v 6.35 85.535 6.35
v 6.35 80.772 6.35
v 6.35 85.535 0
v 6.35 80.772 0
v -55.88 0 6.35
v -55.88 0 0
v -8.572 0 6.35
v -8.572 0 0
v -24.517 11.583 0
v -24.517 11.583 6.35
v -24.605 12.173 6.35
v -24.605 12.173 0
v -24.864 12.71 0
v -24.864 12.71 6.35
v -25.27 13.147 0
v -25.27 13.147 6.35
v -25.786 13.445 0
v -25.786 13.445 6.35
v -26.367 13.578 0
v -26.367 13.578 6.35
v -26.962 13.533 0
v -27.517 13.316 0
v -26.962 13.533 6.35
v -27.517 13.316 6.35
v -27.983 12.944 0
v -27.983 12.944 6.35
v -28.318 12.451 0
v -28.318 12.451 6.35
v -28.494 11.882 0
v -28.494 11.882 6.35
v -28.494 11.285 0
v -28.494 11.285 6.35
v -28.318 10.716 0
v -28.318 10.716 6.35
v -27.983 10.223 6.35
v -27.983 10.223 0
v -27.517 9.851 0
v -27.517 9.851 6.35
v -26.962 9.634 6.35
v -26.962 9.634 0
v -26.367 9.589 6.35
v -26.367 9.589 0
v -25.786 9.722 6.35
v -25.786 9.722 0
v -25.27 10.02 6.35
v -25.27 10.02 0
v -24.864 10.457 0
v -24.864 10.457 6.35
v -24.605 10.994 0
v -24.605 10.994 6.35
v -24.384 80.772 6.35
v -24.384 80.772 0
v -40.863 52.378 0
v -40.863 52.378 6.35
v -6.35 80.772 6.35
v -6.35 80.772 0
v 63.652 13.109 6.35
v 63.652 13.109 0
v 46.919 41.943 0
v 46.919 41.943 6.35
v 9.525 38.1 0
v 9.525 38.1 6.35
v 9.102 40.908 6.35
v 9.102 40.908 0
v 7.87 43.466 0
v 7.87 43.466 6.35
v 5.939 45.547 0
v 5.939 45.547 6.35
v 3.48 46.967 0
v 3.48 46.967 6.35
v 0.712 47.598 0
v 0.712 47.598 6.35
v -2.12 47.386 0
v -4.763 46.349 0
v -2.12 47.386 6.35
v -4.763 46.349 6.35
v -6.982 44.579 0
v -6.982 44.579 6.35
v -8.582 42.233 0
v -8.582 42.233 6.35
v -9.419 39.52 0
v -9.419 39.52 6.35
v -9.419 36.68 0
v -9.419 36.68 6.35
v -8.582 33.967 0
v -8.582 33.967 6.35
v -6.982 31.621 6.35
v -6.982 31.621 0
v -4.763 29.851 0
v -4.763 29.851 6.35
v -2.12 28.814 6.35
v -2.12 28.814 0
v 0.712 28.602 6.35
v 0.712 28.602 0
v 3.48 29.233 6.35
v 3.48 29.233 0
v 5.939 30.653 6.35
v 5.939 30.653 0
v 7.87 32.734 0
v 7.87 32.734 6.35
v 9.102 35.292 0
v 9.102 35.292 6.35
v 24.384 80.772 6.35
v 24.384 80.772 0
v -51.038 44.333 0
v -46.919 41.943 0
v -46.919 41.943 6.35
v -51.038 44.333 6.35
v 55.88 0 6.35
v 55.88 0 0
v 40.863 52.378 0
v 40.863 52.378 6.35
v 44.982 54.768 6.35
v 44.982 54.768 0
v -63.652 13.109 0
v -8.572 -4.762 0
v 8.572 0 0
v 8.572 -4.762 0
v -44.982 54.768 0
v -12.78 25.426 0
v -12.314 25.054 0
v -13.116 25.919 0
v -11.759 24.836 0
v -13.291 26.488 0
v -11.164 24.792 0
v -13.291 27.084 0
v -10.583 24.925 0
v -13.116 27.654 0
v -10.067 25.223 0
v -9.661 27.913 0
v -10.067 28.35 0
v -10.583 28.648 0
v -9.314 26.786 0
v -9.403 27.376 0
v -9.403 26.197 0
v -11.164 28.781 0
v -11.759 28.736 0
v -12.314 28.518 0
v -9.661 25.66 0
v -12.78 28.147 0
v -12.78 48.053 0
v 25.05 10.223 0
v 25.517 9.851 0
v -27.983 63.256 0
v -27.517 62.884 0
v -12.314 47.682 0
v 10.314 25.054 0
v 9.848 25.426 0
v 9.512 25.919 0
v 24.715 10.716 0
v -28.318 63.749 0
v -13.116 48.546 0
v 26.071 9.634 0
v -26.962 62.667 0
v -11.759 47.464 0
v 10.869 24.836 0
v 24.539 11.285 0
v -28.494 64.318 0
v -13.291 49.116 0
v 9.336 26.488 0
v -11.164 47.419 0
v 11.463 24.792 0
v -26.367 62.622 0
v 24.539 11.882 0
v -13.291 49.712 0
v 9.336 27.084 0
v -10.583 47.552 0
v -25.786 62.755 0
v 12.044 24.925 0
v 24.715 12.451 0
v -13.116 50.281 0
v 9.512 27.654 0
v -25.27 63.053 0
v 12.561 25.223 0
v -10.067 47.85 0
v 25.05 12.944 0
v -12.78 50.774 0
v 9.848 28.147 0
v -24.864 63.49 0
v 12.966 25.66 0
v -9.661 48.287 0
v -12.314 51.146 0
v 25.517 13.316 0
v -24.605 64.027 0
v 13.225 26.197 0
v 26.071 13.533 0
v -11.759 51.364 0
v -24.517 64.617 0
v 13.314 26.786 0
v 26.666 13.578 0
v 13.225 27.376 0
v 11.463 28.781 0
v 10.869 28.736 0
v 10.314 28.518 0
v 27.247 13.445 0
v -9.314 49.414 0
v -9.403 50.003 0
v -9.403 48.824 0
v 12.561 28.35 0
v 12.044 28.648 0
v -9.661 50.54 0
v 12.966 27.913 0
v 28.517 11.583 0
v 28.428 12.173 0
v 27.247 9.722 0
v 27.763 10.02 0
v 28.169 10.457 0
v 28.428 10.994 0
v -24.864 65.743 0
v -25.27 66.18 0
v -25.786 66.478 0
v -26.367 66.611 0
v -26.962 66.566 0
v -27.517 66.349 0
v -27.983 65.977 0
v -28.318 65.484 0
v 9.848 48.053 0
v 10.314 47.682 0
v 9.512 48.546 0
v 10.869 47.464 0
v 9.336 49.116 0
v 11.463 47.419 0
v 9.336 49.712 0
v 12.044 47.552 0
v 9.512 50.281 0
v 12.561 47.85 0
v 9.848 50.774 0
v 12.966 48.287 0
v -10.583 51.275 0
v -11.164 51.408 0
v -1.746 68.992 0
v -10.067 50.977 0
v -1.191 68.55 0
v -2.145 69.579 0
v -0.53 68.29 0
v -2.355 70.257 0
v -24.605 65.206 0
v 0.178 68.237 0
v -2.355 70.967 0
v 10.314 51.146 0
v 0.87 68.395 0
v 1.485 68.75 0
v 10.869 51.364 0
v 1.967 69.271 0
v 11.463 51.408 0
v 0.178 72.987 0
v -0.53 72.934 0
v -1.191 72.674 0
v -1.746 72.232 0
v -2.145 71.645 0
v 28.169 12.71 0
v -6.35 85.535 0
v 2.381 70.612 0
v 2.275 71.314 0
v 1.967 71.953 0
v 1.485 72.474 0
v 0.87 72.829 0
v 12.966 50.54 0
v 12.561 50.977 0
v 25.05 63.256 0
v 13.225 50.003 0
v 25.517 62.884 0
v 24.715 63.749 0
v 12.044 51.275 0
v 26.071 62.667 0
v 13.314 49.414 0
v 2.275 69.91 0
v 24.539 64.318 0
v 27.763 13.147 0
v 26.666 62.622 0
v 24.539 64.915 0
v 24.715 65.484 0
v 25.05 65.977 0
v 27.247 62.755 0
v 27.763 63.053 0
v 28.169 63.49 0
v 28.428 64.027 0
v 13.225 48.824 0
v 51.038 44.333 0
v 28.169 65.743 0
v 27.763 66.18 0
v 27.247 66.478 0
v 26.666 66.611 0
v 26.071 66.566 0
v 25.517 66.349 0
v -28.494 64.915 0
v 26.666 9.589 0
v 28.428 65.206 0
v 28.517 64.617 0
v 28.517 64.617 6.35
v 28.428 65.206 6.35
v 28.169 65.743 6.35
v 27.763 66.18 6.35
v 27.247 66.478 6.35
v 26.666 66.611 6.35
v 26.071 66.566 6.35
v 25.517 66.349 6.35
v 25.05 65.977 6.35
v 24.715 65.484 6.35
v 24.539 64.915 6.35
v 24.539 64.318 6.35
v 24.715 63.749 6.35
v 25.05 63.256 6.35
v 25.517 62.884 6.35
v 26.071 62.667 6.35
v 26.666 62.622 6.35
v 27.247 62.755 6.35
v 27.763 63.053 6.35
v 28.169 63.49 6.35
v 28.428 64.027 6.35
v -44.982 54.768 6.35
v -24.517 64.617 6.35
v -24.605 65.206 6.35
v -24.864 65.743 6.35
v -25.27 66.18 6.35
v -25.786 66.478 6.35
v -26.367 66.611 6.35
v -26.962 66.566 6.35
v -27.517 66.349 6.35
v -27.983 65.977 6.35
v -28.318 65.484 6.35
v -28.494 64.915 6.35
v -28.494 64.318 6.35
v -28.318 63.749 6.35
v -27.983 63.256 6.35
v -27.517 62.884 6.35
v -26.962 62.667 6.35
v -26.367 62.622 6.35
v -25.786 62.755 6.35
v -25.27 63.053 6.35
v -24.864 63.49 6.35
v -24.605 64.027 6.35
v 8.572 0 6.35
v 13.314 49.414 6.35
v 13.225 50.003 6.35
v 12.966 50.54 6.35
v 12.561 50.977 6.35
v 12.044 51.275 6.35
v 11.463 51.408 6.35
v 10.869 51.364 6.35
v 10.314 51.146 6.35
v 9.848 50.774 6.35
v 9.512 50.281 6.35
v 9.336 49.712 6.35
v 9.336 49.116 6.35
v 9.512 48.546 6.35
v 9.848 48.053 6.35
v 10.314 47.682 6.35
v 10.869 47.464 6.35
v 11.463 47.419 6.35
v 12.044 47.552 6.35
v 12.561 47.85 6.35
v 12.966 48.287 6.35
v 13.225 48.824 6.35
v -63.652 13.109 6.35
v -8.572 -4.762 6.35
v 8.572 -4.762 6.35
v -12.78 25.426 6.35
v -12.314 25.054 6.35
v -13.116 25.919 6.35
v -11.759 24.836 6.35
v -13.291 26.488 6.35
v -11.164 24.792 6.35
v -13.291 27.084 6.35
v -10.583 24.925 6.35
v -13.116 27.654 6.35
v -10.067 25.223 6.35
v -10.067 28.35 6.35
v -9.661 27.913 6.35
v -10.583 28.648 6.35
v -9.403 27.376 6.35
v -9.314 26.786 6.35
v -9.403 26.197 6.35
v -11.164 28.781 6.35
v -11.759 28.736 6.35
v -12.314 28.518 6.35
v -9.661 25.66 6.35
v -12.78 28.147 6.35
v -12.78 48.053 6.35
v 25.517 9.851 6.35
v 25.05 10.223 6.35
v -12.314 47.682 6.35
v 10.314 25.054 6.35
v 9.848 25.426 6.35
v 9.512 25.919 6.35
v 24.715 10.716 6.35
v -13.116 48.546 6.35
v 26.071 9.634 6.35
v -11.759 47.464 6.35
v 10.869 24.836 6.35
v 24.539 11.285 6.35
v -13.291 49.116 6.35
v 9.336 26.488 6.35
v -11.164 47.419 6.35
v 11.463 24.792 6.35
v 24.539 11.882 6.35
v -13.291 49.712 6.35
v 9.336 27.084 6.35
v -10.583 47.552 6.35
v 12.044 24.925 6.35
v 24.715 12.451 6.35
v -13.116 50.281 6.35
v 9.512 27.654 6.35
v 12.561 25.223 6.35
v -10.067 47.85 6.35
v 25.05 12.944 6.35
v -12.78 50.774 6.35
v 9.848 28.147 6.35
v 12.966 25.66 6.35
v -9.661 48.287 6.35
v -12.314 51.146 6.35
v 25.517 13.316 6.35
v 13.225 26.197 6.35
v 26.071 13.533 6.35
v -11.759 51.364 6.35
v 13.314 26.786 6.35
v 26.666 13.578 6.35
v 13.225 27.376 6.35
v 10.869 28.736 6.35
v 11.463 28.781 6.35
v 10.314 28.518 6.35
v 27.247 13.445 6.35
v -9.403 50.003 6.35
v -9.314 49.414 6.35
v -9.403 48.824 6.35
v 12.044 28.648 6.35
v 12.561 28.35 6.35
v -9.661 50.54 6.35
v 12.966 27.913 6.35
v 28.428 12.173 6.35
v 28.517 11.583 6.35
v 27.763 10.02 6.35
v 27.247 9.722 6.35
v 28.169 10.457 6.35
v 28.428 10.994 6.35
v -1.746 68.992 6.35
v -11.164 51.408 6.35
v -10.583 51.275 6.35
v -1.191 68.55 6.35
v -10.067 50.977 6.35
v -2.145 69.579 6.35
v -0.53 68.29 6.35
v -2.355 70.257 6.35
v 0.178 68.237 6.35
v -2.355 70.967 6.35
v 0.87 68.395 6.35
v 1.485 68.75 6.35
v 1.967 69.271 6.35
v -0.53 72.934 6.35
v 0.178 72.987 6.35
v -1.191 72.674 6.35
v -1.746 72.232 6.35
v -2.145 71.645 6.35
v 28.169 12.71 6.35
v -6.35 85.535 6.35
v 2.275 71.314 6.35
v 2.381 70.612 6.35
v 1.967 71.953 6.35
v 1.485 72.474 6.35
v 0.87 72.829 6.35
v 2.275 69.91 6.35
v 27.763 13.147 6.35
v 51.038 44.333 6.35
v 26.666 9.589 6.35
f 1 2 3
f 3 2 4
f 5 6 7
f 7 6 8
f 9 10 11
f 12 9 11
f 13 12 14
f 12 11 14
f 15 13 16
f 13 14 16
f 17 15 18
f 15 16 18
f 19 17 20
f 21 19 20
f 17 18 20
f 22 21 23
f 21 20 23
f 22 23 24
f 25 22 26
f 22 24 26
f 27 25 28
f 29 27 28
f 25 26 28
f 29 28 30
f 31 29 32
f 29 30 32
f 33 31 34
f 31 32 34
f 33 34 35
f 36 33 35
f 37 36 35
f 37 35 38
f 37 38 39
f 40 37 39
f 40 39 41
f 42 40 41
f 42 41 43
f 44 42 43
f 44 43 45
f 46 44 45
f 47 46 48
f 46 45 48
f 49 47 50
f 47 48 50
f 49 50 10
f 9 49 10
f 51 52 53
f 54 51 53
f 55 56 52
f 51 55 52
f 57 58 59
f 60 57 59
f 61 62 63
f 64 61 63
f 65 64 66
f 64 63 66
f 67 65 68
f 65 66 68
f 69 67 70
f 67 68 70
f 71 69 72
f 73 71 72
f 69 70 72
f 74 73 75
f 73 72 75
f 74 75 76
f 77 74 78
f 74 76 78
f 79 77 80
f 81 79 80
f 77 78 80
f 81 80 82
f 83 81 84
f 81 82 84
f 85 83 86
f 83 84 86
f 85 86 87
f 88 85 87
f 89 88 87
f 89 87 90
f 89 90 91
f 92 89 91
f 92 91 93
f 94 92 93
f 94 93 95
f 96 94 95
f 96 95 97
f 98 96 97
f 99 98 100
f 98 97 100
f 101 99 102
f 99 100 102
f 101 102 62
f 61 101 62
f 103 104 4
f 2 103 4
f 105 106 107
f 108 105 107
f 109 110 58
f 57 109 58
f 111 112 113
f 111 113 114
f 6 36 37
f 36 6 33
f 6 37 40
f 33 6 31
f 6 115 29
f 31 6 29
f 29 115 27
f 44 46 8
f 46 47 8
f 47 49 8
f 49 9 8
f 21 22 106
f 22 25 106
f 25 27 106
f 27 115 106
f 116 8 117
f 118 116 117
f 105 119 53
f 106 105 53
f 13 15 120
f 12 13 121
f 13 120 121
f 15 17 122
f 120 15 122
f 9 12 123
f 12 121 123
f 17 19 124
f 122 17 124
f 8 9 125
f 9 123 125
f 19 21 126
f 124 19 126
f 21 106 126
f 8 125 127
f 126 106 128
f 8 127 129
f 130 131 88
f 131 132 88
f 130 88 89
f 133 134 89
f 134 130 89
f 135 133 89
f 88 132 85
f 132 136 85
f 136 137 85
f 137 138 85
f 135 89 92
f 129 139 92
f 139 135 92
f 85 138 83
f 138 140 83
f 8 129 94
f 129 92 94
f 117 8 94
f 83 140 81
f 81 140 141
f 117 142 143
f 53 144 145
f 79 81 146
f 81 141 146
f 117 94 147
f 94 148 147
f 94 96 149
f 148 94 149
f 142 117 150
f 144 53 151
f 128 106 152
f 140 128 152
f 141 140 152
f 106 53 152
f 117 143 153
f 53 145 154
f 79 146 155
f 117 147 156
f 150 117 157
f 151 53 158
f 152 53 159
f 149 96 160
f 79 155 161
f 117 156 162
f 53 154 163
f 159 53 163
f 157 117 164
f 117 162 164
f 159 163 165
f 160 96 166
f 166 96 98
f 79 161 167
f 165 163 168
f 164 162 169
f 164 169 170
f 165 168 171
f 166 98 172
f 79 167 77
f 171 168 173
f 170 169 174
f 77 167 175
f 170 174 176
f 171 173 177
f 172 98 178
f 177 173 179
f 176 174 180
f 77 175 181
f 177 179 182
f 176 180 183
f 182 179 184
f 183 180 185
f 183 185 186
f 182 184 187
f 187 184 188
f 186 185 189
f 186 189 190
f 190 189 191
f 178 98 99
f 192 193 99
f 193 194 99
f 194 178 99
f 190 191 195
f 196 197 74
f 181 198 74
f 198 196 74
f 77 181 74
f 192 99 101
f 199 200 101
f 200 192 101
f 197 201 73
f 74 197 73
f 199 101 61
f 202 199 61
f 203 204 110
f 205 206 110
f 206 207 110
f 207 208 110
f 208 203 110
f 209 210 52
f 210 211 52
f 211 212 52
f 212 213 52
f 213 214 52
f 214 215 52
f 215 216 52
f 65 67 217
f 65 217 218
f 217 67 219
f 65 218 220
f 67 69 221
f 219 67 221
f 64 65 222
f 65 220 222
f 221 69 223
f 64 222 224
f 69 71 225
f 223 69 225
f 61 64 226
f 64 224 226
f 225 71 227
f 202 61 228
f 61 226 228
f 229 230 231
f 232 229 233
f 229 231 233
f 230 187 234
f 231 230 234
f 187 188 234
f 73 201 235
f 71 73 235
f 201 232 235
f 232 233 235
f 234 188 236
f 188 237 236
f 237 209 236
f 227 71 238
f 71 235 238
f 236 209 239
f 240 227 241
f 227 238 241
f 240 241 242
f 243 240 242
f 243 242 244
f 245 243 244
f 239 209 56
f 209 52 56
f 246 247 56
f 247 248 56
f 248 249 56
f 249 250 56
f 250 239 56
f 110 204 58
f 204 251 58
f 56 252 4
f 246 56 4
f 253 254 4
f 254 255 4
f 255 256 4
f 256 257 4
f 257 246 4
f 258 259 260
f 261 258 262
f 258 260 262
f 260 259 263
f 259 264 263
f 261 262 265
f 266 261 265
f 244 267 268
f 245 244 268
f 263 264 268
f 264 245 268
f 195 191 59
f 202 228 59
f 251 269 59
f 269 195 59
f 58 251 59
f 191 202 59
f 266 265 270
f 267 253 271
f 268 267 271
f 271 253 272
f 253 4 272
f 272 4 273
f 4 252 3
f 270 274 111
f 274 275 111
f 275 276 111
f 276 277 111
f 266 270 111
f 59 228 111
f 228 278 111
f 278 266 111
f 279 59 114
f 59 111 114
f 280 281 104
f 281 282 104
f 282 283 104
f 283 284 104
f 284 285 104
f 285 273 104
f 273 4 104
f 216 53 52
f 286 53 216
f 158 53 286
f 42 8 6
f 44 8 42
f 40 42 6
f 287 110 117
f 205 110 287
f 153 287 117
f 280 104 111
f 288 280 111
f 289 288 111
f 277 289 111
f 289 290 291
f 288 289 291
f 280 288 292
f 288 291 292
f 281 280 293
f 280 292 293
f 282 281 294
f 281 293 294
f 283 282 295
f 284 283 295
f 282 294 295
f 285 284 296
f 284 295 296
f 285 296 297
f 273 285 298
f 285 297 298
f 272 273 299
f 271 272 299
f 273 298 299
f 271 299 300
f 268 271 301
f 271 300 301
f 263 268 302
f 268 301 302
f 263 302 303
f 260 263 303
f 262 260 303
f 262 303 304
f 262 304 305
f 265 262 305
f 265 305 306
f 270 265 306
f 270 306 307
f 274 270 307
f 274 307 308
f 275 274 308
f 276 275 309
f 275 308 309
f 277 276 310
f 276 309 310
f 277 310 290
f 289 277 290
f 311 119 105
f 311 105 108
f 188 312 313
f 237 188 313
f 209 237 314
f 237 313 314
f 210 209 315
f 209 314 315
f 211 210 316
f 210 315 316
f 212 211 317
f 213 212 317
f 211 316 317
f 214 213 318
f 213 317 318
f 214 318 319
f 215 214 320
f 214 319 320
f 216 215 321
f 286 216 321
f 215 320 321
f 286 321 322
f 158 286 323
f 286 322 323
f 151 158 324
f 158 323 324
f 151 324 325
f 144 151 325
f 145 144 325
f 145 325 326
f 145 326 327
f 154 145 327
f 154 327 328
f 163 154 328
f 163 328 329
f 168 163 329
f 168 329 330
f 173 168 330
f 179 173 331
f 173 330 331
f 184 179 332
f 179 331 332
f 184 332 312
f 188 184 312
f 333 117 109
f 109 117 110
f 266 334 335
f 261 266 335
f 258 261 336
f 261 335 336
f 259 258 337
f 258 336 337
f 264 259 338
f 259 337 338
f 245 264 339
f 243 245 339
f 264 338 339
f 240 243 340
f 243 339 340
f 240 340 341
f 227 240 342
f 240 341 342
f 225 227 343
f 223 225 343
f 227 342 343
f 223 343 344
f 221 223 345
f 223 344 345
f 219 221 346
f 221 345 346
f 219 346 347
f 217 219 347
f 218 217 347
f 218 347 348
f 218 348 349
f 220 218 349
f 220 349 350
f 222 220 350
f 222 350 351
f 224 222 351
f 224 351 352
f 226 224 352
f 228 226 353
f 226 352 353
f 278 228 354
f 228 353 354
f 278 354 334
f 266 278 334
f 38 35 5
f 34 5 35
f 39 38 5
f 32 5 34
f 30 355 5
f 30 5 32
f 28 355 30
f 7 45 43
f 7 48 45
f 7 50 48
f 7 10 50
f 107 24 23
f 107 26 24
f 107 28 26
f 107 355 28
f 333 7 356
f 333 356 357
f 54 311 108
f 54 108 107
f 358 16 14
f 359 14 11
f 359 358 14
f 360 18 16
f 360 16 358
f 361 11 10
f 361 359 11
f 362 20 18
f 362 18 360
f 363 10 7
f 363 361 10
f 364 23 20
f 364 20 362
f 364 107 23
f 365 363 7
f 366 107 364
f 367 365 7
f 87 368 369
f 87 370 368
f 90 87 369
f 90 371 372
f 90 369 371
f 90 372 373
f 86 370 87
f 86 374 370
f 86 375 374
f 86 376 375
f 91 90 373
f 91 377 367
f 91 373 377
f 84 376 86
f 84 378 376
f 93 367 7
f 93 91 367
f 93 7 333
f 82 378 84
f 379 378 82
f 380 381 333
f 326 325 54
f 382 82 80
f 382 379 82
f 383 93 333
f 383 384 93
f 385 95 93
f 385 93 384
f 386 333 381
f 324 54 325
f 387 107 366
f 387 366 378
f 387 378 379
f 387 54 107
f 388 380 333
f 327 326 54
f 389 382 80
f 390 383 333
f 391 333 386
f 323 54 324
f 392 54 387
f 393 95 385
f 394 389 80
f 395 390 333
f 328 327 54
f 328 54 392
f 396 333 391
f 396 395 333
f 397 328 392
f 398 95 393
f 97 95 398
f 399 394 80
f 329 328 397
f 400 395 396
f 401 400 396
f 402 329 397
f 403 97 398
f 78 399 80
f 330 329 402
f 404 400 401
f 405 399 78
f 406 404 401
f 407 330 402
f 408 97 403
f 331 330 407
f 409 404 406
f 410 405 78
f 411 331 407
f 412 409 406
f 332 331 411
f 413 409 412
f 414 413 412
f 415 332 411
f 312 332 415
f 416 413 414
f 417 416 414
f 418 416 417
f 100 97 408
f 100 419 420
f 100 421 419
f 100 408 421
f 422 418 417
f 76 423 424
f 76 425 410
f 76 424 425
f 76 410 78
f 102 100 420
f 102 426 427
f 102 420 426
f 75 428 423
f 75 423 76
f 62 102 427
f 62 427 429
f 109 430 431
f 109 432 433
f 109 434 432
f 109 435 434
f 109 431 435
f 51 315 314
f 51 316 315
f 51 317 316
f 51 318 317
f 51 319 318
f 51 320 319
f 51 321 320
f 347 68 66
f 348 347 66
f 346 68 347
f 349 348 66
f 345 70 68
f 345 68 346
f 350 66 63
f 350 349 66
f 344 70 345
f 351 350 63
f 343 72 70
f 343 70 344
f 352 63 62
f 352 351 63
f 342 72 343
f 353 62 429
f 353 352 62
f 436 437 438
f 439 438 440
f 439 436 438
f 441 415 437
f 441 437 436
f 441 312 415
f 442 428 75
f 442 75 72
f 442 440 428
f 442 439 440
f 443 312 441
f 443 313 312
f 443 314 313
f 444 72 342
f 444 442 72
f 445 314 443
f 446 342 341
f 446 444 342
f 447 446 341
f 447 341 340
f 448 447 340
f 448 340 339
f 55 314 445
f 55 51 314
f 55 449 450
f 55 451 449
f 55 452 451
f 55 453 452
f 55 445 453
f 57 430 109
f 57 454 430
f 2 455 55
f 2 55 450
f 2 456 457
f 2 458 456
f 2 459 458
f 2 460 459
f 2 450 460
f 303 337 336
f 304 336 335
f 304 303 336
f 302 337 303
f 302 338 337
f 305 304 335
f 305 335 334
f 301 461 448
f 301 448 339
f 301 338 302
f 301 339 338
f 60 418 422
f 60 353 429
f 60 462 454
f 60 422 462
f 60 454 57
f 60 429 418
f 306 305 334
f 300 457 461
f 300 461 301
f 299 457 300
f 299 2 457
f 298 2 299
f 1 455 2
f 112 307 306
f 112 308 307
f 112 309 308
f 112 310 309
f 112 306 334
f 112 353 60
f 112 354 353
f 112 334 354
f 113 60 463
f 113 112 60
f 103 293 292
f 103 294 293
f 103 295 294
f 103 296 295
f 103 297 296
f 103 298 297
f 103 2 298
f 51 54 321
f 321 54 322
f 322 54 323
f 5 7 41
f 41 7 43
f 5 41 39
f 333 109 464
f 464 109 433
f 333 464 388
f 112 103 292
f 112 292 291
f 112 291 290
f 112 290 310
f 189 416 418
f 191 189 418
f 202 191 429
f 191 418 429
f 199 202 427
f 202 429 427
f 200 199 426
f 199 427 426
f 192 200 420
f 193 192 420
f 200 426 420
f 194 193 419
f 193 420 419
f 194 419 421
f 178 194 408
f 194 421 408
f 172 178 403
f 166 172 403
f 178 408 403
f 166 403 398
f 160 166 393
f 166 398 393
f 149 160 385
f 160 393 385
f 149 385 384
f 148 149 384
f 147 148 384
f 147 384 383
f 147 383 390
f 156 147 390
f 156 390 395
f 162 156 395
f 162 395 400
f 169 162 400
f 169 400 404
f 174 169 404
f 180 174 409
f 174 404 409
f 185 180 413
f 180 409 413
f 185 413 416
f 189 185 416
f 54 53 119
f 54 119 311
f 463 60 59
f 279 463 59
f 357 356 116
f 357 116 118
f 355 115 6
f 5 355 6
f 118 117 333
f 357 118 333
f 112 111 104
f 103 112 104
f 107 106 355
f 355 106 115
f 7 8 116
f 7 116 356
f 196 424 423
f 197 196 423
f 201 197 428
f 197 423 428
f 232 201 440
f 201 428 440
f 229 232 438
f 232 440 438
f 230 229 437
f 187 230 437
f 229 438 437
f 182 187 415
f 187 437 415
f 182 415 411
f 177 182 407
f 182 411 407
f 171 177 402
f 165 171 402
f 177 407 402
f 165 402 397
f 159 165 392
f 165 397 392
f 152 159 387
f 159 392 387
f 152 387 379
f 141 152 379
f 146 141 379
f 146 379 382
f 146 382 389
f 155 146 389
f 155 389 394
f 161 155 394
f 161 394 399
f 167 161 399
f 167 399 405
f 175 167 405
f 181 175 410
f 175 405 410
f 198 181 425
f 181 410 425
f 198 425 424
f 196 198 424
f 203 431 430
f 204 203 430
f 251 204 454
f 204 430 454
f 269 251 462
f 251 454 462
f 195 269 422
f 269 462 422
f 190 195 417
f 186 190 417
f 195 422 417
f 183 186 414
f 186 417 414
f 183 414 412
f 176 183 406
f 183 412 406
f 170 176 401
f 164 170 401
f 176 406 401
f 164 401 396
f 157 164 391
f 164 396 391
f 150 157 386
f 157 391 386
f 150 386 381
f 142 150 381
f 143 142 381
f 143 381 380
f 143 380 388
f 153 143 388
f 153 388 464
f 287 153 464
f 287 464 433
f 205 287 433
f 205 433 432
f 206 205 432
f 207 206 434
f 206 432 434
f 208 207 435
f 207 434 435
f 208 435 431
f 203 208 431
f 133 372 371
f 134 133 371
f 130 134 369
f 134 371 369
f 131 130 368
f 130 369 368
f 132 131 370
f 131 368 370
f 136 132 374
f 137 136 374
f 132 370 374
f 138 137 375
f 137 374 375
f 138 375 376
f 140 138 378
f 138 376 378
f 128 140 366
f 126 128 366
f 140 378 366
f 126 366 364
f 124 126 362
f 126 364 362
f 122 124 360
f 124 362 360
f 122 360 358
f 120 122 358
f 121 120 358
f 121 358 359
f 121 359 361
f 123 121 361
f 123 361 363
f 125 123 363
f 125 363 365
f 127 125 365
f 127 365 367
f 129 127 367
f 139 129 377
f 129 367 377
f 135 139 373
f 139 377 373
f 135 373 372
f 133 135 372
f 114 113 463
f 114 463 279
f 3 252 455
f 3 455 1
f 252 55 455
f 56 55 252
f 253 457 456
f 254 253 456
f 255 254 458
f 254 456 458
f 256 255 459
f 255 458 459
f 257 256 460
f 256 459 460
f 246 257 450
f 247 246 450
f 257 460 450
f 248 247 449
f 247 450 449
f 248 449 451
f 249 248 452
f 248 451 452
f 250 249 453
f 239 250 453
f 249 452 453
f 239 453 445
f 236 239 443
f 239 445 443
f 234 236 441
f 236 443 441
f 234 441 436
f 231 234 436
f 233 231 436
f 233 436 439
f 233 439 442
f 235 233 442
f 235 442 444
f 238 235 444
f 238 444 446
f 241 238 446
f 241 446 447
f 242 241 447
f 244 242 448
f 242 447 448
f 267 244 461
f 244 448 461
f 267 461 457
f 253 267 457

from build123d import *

# Parameters (mm, degrees)
BOSS_EXTRUDE1_DEPTH = 6.35
SKETCH3_R           = 9.525
SKETCH3_R_2         = 2
SKETCH3_R_3         = 2.38125
CUT_EXTRUDE1_DEPTH  = 6.35
SKETCH4_W           = 17.145
SKETCH4_H           = 6.35
BOSS_EXTRUDE2_DEPTH = 4.7625
SKETCH5_W           = 6.35
SKETCH5_H           = 12.065
BOSS_EXTRUDE3_DEPTH = 4.7625
SKETCH6_W           = 6.35
SKETCH6_H           = 12.065
BOSS_EXTRUDE4_DEPTH = 4.7625
SKETCH7_W           = 12.7
SKETCH7_H           = 6.35
BOSS_EXTRUDE5_DEPTH = 4.7625


with BuildPart() as part:
    # Sketch2 → Boss-Extrude1 (new body)
    with BuildSketch(Plane.XY):
        Polygon((24.384, 80.772), (-24.384, 80.772), (-63.652178597, 13.109189138), (-55.88, 0), (55.88, 0), (63.652178597, 13.109189138), align=None)
    extrude(amount=BOSS_EXTRUDE1_DEPTH)

    # Sketch3 → Cut-Extrude1 (cut)
    with BuildSketch(Plane.XY.offset(6.35)):
        with Locations((0, 38.1)):
            Circle(SKETCH3_R)
        with Locations((-11.313708499, 49.413708499)):
            Circle(SKETCH3_R_2)
        with Locations((-11.313708499, 26.786291501)):
            Circle(SKETCH3_R_2)
        with Locations((11.313708499, 26.786291501)):
            Circle(SKETCH3_R_2)
        with Locations((11.313708499, 49.413708499)):
            Circle(SKETCH3_R_2)
        with Locations((26.516504294, 64.616504294)):
            Circle(SKETCH3_R_2)
        with Locations((-26.516504294, 64.616504294)):
            Circle(SKETCH3_R_2)
        with Locations((-26.516504294, 11.583495706)):
            Circle(SKETCH3_R_2)
        with Locations((26.516504294, 11.583495706)):
            Circle(SKETCH3_R_2)
        with Locations((0, 70.612)):
            Circle(SKETCH3_R_3)
    extrude(amount=-CUT_EXTRUDE1_DEPTH, mode=Mode.SUBTRACT)

    # Sketch4 → Boss-Extrude2 (add)
    with BuildSketch(Plane.XZ):
        with Locations((0, 3.175)):
            Rectangle(SKETCH4_W, SKETCH4_H)
    extrude(amount=BOSS_EXTRUDE2_DEPTH)

    # Sketch5 → Boss-Extrude3 (add)
    with BuildSketch(Plane(origin=(-53.306195658, 30.936302893, 0), x_dir=(0, 0, 1), z_dir=(-0.8648994127942479, 0.5019452218600805, 0))):
        with Locations((3.175, 18.75822308)):
            Rectangle(SKETCH5_W, SKETCH5_H)
    extrude(amount=BOSS_EXTRUDE3_DEPTH)

    # Sketch6 → Boss-Extrude4 (add)
    with BuildSketch(Plane(origin=(53.306195658, 30.936302893, 0), x_dir=(0, 0, -1), z_dir=(0.8648994127942479, 0.5019452218600805, 0))):
        with Locations((-3.175, 18.75822308)):
            Rectangle(SKETCH6_W, SKETCH6_H)
    extrude(amount=BOSS_EXTRUDE4_DEPTH)

    # Sketch7 → Boss-Extrude5 (add)
    with BuildSketch(Plane(origin=(0, 80.772, 0), x_dir=(1, 0, 0), z_dir=(0, 1, 0))):
        with Locations((0, -3.175)):
            Rectangle(SKETCH7_W, SKETCH7_H)
    extrude(amount=BOSS_EXTRUDE5_DEPTH)


solid = part.part
